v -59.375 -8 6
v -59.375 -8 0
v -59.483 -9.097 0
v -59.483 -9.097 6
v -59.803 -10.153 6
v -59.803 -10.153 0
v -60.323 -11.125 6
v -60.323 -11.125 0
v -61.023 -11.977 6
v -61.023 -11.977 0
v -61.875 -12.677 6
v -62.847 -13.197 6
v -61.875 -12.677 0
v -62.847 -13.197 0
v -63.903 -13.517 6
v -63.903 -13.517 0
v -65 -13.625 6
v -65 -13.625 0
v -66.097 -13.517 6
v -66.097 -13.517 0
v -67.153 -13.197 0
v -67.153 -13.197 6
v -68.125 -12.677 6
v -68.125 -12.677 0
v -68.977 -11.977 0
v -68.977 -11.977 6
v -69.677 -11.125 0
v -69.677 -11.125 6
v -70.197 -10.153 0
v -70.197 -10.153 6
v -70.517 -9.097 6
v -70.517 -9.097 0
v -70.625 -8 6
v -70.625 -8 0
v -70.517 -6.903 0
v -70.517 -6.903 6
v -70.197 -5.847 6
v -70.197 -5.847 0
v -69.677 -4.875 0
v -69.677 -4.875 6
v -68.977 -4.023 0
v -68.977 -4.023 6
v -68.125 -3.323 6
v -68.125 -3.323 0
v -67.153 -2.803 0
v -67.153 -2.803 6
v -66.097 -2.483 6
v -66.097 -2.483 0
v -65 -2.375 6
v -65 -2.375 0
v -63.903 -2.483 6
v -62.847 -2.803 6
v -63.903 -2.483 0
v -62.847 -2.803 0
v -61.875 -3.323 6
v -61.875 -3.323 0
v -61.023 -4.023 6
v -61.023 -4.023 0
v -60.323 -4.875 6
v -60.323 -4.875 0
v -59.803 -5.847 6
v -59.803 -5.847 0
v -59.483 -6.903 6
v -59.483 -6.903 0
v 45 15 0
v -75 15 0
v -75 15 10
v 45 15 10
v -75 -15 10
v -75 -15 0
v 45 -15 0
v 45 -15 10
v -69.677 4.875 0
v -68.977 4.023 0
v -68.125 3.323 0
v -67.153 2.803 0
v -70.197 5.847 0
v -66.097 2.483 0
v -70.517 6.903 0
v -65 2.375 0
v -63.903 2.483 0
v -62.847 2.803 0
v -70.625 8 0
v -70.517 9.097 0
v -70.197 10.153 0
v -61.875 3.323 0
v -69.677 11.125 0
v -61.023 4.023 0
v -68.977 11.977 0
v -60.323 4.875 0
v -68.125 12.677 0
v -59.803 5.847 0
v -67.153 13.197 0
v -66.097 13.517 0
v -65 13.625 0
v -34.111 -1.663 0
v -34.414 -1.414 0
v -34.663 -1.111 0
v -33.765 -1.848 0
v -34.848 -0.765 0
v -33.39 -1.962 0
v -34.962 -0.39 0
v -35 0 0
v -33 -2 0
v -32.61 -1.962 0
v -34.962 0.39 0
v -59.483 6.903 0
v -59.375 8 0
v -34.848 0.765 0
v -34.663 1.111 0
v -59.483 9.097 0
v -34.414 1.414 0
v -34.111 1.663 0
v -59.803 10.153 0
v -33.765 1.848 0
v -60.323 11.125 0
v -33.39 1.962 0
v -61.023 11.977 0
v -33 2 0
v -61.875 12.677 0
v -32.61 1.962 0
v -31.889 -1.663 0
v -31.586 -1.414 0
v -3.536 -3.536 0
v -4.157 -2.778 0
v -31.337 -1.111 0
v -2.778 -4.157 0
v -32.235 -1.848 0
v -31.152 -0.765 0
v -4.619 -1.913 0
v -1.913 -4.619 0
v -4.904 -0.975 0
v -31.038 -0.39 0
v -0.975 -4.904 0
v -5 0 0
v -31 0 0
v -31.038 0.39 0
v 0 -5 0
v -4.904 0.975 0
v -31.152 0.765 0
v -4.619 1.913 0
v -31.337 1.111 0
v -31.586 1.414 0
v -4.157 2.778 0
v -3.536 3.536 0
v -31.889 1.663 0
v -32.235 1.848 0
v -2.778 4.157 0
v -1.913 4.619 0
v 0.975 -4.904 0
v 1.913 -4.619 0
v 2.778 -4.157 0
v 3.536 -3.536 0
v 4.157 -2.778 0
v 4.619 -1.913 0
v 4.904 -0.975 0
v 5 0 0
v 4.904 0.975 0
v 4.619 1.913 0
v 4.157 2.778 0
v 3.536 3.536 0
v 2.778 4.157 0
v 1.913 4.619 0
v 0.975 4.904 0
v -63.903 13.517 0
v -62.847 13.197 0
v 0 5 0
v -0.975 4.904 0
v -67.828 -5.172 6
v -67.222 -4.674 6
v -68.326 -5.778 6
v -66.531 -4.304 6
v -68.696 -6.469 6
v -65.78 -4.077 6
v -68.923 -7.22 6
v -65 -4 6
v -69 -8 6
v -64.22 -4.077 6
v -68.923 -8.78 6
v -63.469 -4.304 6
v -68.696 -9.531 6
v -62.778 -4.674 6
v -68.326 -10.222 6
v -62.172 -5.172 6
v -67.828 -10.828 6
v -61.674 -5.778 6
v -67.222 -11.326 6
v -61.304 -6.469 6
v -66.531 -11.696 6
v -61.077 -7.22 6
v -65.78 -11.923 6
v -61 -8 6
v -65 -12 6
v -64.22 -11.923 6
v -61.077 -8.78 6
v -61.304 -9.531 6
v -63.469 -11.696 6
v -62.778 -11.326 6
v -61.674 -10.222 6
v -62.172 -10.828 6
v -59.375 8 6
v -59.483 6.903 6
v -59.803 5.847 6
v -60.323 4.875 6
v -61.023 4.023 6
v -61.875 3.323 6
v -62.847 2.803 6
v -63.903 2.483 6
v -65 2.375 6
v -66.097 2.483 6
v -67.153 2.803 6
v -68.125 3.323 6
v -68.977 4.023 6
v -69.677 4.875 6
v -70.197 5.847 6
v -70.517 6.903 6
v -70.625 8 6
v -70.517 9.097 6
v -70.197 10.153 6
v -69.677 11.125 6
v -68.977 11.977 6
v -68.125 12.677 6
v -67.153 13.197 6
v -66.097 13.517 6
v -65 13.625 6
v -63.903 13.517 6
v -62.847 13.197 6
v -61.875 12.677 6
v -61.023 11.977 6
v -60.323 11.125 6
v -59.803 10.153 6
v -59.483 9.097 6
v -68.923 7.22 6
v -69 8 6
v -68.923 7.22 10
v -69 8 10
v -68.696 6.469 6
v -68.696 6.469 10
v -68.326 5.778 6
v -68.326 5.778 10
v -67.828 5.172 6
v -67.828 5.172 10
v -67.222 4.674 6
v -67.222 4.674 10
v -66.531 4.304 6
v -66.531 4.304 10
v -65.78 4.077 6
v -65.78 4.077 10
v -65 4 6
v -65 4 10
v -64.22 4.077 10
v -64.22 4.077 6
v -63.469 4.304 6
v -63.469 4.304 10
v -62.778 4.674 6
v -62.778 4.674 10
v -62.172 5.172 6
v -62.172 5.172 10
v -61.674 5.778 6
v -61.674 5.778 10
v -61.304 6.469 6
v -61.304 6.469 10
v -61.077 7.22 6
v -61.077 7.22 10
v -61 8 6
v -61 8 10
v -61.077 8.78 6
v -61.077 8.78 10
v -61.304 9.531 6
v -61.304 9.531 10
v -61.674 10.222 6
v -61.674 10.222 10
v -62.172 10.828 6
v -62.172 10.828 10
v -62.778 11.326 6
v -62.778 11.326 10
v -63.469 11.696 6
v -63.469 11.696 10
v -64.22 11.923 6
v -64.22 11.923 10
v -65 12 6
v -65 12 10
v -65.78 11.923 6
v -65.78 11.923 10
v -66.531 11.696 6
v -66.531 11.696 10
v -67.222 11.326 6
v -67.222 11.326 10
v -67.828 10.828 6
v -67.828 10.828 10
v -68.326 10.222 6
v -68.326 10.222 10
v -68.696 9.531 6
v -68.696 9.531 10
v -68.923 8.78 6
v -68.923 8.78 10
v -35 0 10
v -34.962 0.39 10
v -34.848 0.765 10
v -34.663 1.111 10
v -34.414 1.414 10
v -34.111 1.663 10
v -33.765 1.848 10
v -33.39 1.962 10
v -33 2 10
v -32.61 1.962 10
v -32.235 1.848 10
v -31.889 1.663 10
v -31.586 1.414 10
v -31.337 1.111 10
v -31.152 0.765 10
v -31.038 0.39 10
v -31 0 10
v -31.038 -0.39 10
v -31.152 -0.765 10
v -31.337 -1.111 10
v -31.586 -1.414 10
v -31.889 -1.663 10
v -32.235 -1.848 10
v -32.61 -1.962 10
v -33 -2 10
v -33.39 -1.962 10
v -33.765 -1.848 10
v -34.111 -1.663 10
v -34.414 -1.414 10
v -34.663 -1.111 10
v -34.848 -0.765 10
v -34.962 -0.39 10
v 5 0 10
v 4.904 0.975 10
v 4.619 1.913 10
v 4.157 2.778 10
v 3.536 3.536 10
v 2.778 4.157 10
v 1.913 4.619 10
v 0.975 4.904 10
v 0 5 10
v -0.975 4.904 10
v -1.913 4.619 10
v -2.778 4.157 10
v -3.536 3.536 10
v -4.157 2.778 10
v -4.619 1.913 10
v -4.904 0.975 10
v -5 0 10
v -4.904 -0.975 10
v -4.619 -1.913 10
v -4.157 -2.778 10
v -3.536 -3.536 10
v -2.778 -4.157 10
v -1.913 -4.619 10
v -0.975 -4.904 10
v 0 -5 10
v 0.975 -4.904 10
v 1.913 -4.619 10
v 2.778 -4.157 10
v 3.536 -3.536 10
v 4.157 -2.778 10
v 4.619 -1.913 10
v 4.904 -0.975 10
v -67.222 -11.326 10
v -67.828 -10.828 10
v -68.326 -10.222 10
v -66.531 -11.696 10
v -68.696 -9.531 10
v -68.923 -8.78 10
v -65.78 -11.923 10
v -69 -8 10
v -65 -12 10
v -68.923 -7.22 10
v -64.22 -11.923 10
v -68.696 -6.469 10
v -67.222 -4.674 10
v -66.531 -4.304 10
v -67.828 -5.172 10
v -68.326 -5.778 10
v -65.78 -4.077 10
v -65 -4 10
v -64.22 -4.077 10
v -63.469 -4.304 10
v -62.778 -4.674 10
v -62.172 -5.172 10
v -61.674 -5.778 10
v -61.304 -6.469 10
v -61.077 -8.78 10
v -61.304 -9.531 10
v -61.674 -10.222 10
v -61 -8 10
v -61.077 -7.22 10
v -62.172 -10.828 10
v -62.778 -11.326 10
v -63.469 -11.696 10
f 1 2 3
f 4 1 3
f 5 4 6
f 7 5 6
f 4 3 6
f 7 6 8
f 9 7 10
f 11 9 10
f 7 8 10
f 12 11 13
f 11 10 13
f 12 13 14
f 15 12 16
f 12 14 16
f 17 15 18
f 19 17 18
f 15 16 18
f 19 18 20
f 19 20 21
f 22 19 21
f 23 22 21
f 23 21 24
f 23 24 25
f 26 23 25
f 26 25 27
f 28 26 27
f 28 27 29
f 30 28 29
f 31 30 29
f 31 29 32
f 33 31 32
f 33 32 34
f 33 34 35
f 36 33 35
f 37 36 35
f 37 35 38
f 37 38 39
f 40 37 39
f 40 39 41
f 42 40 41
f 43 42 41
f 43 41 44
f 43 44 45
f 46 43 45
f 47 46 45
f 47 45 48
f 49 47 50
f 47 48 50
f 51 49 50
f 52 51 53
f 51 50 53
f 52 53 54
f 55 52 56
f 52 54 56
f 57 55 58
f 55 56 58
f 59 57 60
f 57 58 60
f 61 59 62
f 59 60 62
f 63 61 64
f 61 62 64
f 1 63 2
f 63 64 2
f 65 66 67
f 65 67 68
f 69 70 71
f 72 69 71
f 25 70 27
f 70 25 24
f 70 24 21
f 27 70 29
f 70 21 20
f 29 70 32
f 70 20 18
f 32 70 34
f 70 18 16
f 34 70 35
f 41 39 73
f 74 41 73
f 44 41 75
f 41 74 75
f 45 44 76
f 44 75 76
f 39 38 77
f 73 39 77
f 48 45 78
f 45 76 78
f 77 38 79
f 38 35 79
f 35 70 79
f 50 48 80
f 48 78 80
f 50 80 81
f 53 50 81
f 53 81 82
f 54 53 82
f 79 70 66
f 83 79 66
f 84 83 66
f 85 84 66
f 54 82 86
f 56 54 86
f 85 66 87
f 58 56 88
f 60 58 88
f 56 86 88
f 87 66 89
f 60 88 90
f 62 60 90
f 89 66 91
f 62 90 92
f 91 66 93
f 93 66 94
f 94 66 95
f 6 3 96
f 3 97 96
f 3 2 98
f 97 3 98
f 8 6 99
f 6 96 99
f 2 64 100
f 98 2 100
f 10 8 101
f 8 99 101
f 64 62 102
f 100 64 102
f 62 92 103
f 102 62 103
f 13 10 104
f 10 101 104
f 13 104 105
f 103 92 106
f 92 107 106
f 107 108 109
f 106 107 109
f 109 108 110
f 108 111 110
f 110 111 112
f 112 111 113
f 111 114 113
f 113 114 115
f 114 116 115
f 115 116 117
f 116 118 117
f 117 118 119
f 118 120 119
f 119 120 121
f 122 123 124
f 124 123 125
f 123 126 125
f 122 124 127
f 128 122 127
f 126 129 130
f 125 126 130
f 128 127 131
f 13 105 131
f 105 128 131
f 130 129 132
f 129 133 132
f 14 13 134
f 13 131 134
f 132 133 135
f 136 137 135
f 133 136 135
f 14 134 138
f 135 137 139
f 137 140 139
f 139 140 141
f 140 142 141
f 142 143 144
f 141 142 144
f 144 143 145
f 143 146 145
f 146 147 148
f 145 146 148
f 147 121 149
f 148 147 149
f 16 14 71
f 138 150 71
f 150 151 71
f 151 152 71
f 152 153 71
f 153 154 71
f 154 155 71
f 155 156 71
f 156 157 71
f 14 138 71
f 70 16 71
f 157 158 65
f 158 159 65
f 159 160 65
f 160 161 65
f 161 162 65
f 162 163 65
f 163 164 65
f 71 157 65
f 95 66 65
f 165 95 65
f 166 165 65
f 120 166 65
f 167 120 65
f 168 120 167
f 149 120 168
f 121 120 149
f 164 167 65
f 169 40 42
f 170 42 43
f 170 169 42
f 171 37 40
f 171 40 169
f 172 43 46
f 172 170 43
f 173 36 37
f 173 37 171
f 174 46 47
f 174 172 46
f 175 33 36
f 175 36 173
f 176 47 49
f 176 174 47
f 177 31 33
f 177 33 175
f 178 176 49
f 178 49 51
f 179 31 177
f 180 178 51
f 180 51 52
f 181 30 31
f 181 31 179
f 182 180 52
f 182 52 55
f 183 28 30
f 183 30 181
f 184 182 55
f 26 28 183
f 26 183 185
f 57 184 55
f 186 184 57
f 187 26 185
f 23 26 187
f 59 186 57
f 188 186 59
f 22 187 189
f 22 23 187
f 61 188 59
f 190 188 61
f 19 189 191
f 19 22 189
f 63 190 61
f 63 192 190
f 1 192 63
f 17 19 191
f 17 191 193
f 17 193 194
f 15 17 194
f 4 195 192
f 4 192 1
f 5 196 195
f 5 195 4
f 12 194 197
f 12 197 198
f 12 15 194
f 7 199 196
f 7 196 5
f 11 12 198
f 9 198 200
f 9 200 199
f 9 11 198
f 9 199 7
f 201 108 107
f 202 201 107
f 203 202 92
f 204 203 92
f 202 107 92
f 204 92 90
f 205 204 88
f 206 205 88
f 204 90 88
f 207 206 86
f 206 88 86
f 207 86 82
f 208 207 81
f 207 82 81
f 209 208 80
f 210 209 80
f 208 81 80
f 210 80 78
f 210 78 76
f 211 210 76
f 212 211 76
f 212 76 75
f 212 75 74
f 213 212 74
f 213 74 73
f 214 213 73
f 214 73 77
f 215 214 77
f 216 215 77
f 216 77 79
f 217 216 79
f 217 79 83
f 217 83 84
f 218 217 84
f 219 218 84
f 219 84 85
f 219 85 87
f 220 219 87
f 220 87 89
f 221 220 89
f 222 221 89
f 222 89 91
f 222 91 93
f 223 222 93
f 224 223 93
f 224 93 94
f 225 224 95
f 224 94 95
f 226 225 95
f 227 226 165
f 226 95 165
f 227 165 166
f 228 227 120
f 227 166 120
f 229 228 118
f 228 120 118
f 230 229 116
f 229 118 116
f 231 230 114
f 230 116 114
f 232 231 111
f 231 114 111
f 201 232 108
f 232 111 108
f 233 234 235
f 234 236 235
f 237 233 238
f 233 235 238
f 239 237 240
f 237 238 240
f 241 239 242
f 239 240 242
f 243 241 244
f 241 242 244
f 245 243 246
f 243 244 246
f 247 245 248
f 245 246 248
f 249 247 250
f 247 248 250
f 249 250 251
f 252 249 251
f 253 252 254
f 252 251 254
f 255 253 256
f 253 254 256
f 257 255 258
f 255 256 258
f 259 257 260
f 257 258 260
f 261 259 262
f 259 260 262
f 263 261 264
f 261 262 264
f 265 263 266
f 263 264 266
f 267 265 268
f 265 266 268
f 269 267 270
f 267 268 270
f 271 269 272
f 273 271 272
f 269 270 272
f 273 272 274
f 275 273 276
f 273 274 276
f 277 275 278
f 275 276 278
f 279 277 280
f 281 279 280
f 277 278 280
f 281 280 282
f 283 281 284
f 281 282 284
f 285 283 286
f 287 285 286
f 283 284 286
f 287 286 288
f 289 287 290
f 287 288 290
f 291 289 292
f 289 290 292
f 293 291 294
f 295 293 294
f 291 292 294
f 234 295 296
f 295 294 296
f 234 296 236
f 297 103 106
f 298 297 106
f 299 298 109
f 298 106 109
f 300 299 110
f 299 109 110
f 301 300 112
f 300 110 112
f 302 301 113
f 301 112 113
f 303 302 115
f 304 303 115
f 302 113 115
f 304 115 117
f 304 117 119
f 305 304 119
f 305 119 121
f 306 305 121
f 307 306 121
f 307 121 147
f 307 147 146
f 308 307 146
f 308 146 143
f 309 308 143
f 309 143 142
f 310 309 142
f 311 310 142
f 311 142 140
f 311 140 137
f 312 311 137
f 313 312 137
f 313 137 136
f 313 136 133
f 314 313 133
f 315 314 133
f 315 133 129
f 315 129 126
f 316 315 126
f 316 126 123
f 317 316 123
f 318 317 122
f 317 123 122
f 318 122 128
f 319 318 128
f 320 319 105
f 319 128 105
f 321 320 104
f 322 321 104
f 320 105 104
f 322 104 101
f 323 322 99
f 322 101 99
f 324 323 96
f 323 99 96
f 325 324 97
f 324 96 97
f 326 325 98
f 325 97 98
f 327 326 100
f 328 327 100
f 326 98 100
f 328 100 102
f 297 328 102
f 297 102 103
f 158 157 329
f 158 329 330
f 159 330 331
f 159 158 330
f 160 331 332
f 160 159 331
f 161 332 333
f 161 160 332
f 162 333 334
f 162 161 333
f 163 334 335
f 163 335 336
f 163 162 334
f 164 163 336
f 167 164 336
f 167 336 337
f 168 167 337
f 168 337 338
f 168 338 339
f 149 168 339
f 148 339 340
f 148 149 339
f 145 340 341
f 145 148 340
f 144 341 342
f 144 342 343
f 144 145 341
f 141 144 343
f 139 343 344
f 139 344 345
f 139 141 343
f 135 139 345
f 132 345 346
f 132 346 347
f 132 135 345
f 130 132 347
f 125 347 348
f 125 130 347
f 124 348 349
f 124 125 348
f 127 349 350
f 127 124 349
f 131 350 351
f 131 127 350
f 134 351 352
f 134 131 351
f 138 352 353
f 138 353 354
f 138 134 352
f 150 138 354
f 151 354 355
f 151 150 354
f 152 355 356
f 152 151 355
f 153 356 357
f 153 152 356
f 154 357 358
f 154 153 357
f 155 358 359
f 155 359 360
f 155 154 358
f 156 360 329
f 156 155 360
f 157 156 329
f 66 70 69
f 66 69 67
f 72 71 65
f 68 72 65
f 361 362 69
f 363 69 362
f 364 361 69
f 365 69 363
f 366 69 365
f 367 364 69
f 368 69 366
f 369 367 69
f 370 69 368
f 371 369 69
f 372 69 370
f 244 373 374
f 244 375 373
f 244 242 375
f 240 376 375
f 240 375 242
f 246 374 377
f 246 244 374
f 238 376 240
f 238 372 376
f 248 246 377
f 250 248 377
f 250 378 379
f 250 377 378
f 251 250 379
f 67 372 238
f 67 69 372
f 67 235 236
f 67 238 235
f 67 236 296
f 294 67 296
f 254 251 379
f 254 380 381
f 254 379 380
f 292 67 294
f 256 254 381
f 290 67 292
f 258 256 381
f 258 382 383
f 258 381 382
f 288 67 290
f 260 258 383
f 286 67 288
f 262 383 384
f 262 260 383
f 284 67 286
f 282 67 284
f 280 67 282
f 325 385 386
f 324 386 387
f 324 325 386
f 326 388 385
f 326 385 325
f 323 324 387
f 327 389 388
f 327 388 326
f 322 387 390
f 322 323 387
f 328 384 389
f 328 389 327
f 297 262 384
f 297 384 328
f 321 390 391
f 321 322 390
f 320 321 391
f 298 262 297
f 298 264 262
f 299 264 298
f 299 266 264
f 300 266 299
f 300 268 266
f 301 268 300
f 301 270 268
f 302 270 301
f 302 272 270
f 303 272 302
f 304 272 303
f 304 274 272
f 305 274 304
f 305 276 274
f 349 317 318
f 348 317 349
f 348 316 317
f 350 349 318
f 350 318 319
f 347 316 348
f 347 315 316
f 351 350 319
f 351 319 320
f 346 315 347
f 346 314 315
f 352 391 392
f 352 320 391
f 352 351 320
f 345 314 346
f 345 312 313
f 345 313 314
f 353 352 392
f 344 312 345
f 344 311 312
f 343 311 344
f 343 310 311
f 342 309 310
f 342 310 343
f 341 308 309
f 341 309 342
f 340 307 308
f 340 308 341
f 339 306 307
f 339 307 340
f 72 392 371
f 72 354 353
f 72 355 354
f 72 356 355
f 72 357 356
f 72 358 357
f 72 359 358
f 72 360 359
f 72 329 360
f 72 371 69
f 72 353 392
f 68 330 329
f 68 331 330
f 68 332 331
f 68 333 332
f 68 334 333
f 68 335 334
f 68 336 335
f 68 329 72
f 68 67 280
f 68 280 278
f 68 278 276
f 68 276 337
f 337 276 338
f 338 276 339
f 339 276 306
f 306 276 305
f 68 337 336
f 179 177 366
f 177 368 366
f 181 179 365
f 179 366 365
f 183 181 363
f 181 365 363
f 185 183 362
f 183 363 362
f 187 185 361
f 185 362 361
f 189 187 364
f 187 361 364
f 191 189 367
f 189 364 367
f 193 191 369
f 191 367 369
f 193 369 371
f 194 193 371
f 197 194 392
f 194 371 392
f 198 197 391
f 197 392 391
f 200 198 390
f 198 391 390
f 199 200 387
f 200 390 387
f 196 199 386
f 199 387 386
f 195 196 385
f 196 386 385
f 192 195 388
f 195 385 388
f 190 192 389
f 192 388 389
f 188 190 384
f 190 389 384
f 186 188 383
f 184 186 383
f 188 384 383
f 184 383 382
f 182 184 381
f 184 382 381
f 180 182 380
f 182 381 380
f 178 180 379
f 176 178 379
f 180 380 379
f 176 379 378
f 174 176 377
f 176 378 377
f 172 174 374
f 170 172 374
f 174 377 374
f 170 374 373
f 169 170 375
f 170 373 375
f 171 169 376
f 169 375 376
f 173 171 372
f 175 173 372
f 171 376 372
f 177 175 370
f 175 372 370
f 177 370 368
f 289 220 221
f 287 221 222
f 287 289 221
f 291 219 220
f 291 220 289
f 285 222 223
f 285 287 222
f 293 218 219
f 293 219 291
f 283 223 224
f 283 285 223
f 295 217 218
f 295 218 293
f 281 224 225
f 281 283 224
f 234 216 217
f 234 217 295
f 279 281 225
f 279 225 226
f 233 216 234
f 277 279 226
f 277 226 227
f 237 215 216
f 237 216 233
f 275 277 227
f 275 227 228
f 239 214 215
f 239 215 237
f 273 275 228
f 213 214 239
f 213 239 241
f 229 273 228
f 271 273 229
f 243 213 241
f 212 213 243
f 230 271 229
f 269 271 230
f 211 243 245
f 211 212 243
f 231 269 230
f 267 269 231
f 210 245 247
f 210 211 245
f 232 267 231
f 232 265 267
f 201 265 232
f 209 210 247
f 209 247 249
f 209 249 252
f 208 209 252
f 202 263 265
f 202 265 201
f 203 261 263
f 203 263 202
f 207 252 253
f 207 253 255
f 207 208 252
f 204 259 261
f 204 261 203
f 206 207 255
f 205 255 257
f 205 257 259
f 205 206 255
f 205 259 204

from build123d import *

# Parameters (mm, degrees)
F0_W           = 120
F0_H           = 30
F0_R           = 5
F1_DEPTH       = 10
F3_D           = 8
F3_CBORE_D     = 11.25
F3_CBORE_DEPTH = 6
F5_D           = 4


with BuildPart() as f1:
    # F0 (on Top) → F1 (new body)
    with BuildSketch(Plane.XY):
        with Locations((-15, 0)):
            Rectangle(F0_W, F0_H)
        Circle(F0_R, mode=Mode.SUBTRACT)
    extrude(amount=F1_DEPTH)

    # F3 (through all)
    with Locations(Plane(origin=(0, 0, 0), x_dir=(1, 0, 0), z_dir=(0, 0, -1))):
        with Locations((-65, 8), (-65, -8)):
            CounterBoreHole(F3_D / 2, F3_CBORE_D / 2, F3_CBORE_DEPTH)

    # F5 (through all)
    with Locations(Plane.XY.offset(10)):
        with Locations((-33, 0)):
            Hole(F5_D / 2)


solid = f1.part
